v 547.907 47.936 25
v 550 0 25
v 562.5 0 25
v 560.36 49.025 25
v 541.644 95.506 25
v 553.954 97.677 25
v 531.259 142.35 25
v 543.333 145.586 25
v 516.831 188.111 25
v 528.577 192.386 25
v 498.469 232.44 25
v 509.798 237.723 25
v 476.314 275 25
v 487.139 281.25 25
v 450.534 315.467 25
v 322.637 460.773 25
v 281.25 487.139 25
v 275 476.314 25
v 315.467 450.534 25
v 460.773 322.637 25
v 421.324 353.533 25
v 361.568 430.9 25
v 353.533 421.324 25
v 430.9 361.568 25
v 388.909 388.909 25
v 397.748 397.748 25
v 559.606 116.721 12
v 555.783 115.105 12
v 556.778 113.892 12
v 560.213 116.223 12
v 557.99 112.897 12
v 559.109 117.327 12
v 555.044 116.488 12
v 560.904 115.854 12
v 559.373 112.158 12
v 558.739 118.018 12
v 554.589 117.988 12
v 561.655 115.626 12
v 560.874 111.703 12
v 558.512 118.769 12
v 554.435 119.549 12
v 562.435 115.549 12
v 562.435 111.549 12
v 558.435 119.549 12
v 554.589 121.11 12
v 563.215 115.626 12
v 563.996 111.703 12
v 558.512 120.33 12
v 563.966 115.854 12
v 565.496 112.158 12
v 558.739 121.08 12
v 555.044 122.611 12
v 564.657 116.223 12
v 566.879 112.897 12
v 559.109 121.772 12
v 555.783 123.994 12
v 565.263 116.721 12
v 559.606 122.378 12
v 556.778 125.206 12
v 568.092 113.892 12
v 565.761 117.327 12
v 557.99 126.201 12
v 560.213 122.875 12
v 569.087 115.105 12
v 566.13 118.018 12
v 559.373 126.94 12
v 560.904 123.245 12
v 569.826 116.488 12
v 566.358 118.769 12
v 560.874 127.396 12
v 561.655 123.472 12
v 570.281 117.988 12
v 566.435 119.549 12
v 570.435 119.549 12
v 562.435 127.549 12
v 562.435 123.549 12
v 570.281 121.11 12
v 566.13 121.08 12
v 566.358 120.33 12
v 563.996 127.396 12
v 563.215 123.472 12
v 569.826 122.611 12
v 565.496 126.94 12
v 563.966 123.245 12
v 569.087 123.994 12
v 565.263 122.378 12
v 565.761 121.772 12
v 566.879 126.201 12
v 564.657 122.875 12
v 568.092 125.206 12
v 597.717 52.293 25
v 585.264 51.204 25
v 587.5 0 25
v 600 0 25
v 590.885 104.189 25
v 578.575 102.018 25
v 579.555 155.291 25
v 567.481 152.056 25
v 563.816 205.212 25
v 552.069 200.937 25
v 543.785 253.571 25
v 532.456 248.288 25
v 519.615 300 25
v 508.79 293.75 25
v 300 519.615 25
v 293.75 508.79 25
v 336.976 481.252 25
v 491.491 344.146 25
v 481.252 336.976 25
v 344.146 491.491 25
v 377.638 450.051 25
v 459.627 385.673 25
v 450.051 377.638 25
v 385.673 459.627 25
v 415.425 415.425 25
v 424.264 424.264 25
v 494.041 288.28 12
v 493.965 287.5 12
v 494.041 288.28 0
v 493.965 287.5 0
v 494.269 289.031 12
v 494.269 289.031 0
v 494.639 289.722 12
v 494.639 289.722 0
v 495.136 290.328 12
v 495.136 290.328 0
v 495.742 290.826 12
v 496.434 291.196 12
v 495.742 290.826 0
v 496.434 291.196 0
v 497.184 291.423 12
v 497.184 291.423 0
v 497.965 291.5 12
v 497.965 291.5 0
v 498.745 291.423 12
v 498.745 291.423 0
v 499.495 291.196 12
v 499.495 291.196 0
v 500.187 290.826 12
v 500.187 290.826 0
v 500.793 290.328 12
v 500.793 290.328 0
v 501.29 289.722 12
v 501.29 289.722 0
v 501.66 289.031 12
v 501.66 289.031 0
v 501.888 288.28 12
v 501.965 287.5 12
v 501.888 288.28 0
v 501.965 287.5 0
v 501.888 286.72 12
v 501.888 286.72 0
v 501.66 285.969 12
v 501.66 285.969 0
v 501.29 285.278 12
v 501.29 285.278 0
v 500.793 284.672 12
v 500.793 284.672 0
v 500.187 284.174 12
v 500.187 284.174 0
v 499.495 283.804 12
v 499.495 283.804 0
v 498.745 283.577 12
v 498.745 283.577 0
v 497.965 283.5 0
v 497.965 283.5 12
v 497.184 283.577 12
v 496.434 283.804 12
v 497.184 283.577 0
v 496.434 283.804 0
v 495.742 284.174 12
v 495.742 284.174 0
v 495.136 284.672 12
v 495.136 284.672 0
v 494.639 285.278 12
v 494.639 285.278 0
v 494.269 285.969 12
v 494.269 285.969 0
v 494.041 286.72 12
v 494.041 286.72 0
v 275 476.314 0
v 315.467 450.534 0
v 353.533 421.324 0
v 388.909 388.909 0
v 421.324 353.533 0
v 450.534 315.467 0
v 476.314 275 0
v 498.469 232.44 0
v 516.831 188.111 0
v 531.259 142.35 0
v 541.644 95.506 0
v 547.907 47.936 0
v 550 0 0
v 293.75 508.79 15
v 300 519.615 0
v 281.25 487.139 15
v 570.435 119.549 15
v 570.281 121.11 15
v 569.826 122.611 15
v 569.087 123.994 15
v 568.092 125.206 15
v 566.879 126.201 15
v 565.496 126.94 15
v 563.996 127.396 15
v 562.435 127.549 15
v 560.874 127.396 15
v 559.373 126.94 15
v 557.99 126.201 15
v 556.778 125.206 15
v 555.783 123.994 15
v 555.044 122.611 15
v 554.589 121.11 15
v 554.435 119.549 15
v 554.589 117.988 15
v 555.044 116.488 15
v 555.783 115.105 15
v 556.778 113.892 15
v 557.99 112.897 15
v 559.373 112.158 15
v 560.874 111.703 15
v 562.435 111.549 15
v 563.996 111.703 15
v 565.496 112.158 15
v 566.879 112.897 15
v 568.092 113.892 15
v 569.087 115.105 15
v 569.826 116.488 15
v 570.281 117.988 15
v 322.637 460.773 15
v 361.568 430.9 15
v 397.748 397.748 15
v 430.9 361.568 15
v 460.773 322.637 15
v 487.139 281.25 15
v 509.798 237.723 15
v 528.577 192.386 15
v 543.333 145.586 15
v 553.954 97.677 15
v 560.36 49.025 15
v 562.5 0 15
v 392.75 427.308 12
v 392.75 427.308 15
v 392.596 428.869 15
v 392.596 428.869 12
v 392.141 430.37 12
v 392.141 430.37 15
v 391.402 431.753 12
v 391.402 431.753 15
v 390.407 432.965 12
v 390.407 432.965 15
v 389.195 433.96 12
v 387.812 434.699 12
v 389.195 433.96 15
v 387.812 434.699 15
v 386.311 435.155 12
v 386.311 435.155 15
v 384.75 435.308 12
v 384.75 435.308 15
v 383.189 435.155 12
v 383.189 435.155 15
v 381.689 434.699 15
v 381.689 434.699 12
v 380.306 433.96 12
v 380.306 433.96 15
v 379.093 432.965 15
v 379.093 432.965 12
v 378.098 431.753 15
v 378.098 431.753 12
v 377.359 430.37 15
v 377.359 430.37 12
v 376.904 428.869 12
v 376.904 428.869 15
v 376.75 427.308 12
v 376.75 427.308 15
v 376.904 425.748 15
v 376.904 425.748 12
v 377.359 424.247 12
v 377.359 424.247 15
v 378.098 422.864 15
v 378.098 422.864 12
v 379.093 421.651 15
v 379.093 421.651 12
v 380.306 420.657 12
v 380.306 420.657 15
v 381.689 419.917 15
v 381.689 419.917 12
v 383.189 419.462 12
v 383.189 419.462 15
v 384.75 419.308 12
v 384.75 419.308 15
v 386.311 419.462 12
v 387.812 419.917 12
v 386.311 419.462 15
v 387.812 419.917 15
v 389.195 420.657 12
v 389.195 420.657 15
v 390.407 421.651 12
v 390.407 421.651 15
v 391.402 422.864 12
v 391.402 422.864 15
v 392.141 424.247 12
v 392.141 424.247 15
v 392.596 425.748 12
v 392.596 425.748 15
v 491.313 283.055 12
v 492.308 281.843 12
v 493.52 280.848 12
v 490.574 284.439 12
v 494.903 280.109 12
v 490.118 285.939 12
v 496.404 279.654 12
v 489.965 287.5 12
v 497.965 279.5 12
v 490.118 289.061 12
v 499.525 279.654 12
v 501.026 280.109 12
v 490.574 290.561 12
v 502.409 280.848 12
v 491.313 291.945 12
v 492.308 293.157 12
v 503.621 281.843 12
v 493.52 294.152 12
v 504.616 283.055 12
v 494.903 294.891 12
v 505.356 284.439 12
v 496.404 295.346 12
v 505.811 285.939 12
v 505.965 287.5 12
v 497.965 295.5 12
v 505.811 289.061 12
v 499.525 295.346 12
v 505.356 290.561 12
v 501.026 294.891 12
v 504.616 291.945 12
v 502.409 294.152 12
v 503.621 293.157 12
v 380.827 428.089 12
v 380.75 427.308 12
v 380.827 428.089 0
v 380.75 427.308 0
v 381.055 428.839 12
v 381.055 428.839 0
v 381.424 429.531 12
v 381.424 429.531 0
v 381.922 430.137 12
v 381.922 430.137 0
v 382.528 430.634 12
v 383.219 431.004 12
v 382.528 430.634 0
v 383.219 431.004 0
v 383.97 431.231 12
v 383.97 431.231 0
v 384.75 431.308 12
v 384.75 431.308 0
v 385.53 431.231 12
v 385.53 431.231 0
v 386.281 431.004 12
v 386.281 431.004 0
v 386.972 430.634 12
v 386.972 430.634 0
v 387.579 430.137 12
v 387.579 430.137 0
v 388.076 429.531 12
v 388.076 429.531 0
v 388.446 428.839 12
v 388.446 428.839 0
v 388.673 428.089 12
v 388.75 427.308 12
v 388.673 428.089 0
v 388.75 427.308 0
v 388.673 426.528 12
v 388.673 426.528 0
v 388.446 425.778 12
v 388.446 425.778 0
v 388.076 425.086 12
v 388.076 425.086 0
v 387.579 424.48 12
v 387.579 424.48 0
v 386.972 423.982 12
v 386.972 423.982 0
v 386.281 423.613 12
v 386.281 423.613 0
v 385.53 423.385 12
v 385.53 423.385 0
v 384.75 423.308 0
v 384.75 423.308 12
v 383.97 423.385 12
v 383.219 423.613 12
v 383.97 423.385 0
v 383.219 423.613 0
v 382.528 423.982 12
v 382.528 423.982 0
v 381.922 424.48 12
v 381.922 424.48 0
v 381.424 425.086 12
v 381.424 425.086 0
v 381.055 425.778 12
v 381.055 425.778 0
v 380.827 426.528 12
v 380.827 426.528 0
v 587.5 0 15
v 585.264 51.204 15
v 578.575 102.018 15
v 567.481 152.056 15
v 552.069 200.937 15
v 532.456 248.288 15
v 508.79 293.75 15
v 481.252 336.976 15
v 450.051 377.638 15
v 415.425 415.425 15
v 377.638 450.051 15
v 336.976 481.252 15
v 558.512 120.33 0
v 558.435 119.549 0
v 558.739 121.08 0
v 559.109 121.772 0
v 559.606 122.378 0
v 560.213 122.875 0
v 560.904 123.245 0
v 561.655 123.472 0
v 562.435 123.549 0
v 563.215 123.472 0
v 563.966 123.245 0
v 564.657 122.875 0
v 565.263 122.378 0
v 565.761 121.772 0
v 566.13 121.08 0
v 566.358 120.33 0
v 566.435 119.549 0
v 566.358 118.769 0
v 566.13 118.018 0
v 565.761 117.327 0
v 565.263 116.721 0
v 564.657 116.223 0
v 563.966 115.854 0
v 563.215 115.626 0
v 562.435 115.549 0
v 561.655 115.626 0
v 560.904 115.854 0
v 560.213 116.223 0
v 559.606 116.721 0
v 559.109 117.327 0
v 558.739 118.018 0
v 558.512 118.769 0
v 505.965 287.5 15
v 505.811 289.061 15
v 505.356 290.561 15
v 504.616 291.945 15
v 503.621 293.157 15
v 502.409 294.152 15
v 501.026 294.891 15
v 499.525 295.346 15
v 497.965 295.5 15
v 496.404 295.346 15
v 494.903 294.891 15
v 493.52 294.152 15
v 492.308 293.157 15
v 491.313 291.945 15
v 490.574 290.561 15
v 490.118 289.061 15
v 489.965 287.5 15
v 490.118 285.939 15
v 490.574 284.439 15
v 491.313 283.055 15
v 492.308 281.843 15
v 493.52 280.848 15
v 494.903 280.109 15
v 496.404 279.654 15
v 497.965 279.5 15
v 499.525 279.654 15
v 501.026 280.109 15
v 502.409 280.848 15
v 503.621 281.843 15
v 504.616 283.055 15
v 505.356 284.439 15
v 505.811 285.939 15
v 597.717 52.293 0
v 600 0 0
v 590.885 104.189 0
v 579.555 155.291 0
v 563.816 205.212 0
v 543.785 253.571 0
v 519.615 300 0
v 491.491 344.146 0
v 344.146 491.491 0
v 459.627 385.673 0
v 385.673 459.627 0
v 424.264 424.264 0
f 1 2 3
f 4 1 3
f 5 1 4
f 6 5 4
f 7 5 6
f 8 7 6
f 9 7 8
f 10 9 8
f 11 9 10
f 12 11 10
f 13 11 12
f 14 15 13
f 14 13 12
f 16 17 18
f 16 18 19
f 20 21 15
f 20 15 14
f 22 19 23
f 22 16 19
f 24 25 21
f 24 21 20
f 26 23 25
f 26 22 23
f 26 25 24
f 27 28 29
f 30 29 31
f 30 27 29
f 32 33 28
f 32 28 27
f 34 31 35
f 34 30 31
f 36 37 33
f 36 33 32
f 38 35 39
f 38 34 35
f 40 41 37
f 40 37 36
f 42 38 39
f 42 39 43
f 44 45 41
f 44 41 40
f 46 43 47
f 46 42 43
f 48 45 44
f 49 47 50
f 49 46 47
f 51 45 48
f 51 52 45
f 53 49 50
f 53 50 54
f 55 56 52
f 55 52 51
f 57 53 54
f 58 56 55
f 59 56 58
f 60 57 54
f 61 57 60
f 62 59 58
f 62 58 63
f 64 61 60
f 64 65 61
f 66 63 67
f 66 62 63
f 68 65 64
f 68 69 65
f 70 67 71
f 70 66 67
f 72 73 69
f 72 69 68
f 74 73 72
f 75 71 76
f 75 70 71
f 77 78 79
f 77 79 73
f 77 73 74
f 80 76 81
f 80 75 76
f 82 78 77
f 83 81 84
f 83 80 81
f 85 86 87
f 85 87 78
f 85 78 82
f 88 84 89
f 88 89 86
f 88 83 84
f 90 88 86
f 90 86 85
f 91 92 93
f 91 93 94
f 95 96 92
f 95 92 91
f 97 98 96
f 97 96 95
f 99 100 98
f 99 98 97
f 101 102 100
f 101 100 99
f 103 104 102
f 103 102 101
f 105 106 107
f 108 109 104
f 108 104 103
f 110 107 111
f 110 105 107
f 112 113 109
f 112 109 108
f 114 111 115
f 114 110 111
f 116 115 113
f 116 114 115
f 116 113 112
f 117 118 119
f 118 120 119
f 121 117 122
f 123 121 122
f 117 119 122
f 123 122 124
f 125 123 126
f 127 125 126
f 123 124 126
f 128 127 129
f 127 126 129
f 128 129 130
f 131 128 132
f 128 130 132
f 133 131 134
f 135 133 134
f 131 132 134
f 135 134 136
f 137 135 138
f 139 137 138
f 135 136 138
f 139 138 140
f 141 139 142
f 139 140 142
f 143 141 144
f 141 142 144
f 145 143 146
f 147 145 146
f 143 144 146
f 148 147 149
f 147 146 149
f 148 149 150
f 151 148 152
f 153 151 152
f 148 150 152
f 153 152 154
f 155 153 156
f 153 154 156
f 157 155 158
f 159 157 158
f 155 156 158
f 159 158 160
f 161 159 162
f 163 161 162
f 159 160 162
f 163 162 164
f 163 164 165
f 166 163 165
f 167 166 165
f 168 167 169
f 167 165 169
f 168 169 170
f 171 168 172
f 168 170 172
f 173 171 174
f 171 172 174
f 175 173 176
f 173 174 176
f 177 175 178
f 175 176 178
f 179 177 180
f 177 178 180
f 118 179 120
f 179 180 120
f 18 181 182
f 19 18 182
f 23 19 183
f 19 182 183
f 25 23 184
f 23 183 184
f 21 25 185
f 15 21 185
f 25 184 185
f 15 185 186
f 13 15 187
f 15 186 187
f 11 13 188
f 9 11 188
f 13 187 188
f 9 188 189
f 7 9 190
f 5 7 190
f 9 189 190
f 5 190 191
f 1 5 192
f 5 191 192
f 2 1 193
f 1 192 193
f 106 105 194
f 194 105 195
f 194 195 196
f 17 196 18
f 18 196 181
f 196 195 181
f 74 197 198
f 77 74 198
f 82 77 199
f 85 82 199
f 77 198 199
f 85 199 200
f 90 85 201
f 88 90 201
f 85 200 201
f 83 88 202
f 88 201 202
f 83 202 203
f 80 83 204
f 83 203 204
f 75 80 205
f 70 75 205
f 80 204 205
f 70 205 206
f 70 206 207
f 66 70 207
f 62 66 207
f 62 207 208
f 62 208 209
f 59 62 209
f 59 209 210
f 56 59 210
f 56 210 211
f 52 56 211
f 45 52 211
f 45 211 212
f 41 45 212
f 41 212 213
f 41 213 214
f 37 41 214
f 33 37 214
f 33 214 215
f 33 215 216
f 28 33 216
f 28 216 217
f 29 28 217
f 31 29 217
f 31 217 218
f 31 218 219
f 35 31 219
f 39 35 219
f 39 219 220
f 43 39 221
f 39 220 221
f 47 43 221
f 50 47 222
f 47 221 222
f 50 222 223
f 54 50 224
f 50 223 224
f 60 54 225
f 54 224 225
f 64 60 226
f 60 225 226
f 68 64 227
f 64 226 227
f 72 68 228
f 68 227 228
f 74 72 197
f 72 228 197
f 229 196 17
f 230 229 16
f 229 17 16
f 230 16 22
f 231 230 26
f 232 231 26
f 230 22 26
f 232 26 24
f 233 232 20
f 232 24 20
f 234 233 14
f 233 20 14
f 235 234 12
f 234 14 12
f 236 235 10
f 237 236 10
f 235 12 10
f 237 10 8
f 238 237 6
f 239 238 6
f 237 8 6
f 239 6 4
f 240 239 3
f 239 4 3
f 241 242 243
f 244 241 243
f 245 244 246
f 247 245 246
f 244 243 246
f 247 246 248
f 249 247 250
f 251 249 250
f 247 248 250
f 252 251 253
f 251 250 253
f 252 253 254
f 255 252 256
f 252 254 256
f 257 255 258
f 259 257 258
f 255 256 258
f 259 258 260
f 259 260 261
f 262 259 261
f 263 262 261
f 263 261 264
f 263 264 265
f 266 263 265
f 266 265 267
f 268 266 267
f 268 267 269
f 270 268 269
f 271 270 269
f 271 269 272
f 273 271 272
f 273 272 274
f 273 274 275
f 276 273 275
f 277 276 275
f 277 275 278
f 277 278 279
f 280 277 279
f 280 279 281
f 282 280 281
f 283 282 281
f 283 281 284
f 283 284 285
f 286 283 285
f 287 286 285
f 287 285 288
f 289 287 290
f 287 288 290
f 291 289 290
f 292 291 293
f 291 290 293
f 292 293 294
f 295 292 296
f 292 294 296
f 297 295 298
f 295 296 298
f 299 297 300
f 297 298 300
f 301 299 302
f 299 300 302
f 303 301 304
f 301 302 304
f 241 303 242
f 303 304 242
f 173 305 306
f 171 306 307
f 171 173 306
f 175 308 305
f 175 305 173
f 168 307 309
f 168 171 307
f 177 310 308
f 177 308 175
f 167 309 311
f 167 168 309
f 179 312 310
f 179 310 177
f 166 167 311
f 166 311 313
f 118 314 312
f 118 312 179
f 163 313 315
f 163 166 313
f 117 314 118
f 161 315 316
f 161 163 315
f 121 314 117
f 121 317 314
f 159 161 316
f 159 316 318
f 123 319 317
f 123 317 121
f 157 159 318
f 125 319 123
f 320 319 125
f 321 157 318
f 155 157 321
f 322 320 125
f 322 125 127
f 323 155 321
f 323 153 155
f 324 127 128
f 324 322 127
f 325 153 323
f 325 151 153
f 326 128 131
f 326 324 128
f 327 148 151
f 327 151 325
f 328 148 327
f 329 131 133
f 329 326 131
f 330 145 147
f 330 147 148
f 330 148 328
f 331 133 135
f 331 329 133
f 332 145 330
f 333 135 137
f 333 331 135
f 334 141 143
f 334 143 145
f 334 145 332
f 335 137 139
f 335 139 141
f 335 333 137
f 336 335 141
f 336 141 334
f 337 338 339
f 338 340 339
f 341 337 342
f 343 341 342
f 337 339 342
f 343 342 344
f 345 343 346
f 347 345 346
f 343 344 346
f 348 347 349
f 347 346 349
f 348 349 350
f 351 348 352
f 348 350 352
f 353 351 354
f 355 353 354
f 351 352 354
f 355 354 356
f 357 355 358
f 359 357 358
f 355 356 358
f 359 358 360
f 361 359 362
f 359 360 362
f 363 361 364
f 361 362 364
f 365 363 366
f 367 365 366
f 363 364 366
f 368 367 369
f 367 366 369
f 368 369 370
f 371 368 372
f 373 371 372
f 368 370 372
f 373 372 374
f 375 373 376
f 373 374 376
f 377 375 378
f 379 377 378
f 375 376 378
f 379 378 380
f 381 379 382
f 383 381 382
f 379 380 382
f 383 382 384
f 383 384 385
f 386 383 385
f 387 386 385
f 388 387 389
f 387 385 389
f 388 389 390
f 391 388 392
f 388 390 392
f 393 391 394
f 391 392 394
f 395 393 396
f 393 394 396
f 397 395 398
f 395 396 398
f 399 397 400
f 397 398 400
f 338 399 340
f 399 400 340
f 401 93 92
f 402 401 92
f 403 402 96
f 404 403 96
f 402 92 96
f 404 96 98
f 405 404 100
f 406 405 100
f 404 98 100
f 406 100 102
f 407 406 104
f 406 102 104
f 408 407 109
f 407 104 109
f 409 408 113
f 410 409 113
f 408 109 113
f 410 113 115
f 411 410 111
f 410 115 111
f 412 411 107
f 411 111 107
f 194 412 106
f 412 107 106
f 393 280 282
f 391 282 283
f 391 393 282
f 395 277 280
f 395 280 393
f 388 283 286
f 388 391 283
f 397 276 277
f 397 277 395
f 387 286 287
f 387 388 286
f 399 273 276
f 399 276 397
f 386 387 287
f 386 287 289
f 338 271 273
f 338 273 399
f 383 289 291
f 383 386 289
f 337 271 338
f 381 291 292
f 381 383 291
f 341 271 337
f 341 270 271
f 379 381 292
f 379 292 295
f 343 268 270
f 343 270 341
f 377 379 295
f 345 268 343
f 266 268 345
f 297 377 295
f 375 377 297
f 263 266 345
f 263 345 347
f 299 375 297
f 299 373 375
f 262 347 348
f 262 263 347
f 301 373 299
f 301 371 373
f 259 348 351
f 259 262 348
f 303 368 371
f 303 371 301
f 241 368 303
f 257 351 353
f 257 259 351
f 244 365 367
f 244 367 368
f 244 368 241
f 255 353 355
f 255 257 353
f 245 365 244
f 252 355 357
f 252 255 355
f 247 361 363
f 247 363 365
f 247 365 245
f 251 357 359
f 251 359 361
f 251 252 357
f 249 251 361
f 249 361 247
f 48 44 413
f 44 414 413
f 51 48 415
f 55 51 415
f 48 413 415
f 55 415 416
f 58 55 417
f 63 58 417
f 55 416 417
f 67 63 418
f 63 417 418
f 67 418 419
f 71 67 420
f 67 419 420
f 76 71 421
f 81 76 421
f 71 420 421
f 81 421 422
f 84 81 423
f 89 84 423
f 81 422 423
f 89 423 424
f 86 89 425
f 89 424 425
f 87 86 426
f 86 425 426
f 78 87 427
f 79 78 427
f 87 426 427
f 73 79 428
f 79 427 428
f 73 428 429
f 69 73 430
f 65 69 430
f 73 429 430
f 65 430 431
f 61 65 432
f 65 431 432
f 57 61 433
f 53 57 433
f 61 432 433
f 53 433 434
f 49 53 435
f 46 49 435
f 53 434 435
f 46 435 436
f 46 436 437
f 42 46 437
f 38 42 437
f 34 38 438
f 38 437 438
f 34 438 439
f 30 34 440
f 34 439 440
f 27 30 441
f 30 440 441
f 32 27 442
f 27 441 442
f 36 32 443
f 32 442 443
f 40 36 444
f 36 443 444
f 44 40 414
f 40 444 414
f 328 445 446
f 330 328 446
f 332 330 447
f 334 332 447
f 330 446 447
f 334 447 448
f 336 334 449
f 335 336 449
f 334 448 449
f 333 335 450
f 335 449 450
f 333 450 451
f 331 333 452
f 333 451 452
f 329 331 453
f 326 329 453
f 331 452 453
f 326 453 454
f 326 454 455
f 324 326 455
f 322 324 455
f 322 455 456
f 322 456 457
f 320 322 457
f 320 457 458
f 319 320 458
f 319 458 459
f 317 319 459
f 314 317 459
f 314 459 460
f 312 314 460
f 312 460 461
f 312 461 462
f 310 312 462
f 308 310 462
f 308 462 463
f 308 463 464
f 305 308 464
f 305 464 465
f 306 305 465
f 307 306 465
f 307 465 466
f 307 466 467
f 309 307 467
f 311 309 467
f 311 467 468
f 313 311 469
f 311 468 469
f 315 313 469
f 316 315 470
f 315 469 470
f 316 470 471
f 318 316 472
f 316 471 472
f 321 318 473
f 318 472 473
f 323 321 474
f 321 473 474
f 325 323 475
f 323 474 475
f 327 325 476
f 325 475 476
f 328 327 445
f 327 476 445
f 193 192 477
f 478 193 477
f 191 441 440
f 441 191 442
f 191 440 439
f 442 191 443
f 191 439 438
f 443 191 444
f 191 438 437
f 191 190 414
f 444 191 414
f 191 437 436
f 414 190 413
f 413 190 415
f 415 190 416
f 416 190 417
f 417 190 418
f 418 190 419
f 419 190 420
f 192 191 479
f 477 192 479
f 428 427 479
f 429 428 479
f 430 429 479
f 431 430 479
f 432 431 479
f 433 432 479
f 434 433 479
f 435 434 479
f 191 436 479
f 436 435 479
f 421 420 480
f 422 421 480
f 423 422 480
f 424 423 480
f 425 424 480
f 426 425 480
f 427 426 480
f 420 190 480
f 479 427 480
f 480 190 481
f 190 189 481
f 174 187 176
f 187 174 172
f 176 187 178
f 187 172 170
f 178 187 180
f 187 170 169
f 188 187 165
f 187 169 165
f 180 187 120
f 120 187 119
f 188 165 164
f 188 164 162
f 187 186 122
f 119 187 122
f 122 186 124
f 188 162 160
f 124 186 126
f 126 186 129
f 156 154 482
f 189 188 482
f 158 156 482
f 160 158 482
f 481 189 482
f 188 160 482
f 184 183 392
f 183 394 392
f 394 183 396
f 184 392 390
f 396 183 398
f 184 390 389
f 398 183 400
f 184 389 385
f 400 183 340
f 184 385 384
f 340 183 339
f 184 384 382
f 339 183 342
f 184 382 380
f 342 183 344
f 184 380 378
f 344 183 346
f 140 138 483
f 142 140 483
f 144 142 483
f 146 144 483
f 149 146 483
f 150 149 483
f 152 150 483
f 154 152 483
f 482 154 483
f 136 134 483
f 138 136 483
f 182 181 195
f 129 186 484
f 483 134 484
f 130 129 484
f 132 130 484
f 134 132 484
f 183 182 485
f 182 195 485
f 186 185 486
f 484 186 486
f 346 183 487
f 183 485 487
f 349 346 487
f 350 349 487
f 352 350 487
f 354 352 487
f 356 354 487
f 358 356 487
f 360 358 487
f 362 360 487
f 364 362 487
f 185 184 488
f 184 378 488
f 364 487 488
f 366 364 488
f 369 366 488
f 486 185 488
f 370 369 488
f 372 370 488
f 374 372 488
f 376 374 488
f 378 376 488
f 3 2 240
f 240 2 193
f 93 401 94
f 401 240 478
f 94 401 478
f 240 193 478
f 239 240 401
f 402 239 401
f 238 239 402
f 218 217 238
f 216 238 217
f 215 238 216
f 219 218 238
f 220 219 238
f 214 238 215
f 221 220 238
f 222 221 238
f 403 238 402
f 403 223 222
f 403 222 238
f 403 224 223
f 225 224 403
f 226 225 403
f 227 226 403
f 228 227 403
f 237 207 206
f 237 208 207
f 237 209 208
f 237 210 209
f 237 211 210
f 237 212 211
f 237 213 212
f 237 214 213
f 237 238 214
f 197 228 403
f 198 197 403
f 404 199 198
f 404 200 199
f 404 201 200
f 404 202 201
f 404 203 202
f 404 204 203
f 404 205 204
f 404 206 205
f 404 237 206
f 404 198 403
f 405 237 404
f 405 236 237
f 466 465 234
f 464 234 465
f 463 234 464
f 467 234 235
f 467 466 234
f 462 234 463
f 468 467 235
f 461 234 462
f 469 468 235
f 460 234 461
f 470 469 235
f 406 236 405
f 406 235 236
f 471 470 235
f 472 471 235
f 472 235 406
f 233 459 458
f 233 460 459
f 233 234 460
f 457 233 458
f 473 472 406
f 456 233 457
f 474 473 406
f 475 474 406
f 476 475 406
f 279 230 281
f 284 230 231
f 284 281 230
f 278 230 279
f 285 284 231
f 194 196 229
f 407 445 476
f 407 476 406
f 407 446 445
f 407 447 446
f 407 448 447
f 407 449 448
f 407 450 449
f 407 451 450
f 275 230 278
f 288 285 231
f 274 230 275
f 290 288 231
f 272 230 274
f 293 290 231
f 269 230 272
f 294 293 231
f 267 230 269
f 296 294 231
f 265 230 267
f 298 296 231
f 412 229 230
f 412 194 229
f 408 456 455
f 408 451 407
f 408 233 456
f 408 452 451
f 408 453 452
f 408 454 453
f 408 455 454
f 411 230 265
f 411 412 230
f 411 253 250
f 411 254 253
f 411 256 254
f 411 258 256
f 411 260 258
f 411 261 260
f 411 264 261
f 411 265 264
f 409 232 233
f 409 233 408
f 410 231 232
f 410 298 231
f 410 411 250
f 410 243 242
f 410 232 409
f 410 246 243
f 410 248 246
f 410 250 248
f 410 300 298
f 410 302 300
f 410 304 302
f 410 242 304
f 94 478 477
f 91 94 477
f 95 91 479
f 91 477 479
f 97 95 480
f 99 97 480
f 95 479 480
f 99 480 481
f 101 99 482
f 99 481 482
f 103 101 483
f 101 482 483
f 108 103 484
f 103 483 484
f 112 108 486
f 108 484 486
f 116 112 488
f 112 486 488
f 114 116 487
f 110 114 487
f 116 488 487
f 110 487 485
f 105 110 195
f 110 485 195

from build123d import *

# Parameters (mm, degrees)
F1_DEPTH       = 25
F3_DEPTH       = 10
F5_D           = 8
F5_CBORE_D     = 16
F5_CBORE_DEPTH = 3


with BuildPart() as f1:
    # F0 (on Top) → F1 (new body)
    with BuildSketch(Plane.XY):
        with BuildLine():
            Line((300, 519.615242), (275, 476.313972))
            ThreePointArc((275, 476.313972), (476.313972, 275), (550, 0))
            Line((550, 0), (600, 0))
            ThreePointArc((600, 0), (519.615242, 300), (300, 519.615242))
        make_face()
    extrude(amount=F1_DEPTH)

    # F2 (on face) → F3 (cut)
    with BuildSketch(Plane.XY.offset(25)):
        with BuildLine():
            Line((293.75, 508.789925), (281.25, 487.13929))
            ThreePointArc((281.25, 487.13929), (487.13929, 281.25), (562.5, 0))
            Line((562.5, 0), (587.5, 0))
            ThreePointArc((587.5, 0), (508.789925, 293.75), (293.75, 508.789925))
        make_face()
    extrude(amount=-F3_DEPTH, mode=Mode.SUBTRACT)

    # F5 (through all)
    with Locations(Plane.XY.offset(15)):
        with Locations((497.964607, 287.5), (384.750099, 427.308275), (562.43487, 119.549222)):
            CounterBoreHole(F5_D / 2, F5_CBORE_D / 2, F5_CBORE_DEPTH)


solid = f1.part
